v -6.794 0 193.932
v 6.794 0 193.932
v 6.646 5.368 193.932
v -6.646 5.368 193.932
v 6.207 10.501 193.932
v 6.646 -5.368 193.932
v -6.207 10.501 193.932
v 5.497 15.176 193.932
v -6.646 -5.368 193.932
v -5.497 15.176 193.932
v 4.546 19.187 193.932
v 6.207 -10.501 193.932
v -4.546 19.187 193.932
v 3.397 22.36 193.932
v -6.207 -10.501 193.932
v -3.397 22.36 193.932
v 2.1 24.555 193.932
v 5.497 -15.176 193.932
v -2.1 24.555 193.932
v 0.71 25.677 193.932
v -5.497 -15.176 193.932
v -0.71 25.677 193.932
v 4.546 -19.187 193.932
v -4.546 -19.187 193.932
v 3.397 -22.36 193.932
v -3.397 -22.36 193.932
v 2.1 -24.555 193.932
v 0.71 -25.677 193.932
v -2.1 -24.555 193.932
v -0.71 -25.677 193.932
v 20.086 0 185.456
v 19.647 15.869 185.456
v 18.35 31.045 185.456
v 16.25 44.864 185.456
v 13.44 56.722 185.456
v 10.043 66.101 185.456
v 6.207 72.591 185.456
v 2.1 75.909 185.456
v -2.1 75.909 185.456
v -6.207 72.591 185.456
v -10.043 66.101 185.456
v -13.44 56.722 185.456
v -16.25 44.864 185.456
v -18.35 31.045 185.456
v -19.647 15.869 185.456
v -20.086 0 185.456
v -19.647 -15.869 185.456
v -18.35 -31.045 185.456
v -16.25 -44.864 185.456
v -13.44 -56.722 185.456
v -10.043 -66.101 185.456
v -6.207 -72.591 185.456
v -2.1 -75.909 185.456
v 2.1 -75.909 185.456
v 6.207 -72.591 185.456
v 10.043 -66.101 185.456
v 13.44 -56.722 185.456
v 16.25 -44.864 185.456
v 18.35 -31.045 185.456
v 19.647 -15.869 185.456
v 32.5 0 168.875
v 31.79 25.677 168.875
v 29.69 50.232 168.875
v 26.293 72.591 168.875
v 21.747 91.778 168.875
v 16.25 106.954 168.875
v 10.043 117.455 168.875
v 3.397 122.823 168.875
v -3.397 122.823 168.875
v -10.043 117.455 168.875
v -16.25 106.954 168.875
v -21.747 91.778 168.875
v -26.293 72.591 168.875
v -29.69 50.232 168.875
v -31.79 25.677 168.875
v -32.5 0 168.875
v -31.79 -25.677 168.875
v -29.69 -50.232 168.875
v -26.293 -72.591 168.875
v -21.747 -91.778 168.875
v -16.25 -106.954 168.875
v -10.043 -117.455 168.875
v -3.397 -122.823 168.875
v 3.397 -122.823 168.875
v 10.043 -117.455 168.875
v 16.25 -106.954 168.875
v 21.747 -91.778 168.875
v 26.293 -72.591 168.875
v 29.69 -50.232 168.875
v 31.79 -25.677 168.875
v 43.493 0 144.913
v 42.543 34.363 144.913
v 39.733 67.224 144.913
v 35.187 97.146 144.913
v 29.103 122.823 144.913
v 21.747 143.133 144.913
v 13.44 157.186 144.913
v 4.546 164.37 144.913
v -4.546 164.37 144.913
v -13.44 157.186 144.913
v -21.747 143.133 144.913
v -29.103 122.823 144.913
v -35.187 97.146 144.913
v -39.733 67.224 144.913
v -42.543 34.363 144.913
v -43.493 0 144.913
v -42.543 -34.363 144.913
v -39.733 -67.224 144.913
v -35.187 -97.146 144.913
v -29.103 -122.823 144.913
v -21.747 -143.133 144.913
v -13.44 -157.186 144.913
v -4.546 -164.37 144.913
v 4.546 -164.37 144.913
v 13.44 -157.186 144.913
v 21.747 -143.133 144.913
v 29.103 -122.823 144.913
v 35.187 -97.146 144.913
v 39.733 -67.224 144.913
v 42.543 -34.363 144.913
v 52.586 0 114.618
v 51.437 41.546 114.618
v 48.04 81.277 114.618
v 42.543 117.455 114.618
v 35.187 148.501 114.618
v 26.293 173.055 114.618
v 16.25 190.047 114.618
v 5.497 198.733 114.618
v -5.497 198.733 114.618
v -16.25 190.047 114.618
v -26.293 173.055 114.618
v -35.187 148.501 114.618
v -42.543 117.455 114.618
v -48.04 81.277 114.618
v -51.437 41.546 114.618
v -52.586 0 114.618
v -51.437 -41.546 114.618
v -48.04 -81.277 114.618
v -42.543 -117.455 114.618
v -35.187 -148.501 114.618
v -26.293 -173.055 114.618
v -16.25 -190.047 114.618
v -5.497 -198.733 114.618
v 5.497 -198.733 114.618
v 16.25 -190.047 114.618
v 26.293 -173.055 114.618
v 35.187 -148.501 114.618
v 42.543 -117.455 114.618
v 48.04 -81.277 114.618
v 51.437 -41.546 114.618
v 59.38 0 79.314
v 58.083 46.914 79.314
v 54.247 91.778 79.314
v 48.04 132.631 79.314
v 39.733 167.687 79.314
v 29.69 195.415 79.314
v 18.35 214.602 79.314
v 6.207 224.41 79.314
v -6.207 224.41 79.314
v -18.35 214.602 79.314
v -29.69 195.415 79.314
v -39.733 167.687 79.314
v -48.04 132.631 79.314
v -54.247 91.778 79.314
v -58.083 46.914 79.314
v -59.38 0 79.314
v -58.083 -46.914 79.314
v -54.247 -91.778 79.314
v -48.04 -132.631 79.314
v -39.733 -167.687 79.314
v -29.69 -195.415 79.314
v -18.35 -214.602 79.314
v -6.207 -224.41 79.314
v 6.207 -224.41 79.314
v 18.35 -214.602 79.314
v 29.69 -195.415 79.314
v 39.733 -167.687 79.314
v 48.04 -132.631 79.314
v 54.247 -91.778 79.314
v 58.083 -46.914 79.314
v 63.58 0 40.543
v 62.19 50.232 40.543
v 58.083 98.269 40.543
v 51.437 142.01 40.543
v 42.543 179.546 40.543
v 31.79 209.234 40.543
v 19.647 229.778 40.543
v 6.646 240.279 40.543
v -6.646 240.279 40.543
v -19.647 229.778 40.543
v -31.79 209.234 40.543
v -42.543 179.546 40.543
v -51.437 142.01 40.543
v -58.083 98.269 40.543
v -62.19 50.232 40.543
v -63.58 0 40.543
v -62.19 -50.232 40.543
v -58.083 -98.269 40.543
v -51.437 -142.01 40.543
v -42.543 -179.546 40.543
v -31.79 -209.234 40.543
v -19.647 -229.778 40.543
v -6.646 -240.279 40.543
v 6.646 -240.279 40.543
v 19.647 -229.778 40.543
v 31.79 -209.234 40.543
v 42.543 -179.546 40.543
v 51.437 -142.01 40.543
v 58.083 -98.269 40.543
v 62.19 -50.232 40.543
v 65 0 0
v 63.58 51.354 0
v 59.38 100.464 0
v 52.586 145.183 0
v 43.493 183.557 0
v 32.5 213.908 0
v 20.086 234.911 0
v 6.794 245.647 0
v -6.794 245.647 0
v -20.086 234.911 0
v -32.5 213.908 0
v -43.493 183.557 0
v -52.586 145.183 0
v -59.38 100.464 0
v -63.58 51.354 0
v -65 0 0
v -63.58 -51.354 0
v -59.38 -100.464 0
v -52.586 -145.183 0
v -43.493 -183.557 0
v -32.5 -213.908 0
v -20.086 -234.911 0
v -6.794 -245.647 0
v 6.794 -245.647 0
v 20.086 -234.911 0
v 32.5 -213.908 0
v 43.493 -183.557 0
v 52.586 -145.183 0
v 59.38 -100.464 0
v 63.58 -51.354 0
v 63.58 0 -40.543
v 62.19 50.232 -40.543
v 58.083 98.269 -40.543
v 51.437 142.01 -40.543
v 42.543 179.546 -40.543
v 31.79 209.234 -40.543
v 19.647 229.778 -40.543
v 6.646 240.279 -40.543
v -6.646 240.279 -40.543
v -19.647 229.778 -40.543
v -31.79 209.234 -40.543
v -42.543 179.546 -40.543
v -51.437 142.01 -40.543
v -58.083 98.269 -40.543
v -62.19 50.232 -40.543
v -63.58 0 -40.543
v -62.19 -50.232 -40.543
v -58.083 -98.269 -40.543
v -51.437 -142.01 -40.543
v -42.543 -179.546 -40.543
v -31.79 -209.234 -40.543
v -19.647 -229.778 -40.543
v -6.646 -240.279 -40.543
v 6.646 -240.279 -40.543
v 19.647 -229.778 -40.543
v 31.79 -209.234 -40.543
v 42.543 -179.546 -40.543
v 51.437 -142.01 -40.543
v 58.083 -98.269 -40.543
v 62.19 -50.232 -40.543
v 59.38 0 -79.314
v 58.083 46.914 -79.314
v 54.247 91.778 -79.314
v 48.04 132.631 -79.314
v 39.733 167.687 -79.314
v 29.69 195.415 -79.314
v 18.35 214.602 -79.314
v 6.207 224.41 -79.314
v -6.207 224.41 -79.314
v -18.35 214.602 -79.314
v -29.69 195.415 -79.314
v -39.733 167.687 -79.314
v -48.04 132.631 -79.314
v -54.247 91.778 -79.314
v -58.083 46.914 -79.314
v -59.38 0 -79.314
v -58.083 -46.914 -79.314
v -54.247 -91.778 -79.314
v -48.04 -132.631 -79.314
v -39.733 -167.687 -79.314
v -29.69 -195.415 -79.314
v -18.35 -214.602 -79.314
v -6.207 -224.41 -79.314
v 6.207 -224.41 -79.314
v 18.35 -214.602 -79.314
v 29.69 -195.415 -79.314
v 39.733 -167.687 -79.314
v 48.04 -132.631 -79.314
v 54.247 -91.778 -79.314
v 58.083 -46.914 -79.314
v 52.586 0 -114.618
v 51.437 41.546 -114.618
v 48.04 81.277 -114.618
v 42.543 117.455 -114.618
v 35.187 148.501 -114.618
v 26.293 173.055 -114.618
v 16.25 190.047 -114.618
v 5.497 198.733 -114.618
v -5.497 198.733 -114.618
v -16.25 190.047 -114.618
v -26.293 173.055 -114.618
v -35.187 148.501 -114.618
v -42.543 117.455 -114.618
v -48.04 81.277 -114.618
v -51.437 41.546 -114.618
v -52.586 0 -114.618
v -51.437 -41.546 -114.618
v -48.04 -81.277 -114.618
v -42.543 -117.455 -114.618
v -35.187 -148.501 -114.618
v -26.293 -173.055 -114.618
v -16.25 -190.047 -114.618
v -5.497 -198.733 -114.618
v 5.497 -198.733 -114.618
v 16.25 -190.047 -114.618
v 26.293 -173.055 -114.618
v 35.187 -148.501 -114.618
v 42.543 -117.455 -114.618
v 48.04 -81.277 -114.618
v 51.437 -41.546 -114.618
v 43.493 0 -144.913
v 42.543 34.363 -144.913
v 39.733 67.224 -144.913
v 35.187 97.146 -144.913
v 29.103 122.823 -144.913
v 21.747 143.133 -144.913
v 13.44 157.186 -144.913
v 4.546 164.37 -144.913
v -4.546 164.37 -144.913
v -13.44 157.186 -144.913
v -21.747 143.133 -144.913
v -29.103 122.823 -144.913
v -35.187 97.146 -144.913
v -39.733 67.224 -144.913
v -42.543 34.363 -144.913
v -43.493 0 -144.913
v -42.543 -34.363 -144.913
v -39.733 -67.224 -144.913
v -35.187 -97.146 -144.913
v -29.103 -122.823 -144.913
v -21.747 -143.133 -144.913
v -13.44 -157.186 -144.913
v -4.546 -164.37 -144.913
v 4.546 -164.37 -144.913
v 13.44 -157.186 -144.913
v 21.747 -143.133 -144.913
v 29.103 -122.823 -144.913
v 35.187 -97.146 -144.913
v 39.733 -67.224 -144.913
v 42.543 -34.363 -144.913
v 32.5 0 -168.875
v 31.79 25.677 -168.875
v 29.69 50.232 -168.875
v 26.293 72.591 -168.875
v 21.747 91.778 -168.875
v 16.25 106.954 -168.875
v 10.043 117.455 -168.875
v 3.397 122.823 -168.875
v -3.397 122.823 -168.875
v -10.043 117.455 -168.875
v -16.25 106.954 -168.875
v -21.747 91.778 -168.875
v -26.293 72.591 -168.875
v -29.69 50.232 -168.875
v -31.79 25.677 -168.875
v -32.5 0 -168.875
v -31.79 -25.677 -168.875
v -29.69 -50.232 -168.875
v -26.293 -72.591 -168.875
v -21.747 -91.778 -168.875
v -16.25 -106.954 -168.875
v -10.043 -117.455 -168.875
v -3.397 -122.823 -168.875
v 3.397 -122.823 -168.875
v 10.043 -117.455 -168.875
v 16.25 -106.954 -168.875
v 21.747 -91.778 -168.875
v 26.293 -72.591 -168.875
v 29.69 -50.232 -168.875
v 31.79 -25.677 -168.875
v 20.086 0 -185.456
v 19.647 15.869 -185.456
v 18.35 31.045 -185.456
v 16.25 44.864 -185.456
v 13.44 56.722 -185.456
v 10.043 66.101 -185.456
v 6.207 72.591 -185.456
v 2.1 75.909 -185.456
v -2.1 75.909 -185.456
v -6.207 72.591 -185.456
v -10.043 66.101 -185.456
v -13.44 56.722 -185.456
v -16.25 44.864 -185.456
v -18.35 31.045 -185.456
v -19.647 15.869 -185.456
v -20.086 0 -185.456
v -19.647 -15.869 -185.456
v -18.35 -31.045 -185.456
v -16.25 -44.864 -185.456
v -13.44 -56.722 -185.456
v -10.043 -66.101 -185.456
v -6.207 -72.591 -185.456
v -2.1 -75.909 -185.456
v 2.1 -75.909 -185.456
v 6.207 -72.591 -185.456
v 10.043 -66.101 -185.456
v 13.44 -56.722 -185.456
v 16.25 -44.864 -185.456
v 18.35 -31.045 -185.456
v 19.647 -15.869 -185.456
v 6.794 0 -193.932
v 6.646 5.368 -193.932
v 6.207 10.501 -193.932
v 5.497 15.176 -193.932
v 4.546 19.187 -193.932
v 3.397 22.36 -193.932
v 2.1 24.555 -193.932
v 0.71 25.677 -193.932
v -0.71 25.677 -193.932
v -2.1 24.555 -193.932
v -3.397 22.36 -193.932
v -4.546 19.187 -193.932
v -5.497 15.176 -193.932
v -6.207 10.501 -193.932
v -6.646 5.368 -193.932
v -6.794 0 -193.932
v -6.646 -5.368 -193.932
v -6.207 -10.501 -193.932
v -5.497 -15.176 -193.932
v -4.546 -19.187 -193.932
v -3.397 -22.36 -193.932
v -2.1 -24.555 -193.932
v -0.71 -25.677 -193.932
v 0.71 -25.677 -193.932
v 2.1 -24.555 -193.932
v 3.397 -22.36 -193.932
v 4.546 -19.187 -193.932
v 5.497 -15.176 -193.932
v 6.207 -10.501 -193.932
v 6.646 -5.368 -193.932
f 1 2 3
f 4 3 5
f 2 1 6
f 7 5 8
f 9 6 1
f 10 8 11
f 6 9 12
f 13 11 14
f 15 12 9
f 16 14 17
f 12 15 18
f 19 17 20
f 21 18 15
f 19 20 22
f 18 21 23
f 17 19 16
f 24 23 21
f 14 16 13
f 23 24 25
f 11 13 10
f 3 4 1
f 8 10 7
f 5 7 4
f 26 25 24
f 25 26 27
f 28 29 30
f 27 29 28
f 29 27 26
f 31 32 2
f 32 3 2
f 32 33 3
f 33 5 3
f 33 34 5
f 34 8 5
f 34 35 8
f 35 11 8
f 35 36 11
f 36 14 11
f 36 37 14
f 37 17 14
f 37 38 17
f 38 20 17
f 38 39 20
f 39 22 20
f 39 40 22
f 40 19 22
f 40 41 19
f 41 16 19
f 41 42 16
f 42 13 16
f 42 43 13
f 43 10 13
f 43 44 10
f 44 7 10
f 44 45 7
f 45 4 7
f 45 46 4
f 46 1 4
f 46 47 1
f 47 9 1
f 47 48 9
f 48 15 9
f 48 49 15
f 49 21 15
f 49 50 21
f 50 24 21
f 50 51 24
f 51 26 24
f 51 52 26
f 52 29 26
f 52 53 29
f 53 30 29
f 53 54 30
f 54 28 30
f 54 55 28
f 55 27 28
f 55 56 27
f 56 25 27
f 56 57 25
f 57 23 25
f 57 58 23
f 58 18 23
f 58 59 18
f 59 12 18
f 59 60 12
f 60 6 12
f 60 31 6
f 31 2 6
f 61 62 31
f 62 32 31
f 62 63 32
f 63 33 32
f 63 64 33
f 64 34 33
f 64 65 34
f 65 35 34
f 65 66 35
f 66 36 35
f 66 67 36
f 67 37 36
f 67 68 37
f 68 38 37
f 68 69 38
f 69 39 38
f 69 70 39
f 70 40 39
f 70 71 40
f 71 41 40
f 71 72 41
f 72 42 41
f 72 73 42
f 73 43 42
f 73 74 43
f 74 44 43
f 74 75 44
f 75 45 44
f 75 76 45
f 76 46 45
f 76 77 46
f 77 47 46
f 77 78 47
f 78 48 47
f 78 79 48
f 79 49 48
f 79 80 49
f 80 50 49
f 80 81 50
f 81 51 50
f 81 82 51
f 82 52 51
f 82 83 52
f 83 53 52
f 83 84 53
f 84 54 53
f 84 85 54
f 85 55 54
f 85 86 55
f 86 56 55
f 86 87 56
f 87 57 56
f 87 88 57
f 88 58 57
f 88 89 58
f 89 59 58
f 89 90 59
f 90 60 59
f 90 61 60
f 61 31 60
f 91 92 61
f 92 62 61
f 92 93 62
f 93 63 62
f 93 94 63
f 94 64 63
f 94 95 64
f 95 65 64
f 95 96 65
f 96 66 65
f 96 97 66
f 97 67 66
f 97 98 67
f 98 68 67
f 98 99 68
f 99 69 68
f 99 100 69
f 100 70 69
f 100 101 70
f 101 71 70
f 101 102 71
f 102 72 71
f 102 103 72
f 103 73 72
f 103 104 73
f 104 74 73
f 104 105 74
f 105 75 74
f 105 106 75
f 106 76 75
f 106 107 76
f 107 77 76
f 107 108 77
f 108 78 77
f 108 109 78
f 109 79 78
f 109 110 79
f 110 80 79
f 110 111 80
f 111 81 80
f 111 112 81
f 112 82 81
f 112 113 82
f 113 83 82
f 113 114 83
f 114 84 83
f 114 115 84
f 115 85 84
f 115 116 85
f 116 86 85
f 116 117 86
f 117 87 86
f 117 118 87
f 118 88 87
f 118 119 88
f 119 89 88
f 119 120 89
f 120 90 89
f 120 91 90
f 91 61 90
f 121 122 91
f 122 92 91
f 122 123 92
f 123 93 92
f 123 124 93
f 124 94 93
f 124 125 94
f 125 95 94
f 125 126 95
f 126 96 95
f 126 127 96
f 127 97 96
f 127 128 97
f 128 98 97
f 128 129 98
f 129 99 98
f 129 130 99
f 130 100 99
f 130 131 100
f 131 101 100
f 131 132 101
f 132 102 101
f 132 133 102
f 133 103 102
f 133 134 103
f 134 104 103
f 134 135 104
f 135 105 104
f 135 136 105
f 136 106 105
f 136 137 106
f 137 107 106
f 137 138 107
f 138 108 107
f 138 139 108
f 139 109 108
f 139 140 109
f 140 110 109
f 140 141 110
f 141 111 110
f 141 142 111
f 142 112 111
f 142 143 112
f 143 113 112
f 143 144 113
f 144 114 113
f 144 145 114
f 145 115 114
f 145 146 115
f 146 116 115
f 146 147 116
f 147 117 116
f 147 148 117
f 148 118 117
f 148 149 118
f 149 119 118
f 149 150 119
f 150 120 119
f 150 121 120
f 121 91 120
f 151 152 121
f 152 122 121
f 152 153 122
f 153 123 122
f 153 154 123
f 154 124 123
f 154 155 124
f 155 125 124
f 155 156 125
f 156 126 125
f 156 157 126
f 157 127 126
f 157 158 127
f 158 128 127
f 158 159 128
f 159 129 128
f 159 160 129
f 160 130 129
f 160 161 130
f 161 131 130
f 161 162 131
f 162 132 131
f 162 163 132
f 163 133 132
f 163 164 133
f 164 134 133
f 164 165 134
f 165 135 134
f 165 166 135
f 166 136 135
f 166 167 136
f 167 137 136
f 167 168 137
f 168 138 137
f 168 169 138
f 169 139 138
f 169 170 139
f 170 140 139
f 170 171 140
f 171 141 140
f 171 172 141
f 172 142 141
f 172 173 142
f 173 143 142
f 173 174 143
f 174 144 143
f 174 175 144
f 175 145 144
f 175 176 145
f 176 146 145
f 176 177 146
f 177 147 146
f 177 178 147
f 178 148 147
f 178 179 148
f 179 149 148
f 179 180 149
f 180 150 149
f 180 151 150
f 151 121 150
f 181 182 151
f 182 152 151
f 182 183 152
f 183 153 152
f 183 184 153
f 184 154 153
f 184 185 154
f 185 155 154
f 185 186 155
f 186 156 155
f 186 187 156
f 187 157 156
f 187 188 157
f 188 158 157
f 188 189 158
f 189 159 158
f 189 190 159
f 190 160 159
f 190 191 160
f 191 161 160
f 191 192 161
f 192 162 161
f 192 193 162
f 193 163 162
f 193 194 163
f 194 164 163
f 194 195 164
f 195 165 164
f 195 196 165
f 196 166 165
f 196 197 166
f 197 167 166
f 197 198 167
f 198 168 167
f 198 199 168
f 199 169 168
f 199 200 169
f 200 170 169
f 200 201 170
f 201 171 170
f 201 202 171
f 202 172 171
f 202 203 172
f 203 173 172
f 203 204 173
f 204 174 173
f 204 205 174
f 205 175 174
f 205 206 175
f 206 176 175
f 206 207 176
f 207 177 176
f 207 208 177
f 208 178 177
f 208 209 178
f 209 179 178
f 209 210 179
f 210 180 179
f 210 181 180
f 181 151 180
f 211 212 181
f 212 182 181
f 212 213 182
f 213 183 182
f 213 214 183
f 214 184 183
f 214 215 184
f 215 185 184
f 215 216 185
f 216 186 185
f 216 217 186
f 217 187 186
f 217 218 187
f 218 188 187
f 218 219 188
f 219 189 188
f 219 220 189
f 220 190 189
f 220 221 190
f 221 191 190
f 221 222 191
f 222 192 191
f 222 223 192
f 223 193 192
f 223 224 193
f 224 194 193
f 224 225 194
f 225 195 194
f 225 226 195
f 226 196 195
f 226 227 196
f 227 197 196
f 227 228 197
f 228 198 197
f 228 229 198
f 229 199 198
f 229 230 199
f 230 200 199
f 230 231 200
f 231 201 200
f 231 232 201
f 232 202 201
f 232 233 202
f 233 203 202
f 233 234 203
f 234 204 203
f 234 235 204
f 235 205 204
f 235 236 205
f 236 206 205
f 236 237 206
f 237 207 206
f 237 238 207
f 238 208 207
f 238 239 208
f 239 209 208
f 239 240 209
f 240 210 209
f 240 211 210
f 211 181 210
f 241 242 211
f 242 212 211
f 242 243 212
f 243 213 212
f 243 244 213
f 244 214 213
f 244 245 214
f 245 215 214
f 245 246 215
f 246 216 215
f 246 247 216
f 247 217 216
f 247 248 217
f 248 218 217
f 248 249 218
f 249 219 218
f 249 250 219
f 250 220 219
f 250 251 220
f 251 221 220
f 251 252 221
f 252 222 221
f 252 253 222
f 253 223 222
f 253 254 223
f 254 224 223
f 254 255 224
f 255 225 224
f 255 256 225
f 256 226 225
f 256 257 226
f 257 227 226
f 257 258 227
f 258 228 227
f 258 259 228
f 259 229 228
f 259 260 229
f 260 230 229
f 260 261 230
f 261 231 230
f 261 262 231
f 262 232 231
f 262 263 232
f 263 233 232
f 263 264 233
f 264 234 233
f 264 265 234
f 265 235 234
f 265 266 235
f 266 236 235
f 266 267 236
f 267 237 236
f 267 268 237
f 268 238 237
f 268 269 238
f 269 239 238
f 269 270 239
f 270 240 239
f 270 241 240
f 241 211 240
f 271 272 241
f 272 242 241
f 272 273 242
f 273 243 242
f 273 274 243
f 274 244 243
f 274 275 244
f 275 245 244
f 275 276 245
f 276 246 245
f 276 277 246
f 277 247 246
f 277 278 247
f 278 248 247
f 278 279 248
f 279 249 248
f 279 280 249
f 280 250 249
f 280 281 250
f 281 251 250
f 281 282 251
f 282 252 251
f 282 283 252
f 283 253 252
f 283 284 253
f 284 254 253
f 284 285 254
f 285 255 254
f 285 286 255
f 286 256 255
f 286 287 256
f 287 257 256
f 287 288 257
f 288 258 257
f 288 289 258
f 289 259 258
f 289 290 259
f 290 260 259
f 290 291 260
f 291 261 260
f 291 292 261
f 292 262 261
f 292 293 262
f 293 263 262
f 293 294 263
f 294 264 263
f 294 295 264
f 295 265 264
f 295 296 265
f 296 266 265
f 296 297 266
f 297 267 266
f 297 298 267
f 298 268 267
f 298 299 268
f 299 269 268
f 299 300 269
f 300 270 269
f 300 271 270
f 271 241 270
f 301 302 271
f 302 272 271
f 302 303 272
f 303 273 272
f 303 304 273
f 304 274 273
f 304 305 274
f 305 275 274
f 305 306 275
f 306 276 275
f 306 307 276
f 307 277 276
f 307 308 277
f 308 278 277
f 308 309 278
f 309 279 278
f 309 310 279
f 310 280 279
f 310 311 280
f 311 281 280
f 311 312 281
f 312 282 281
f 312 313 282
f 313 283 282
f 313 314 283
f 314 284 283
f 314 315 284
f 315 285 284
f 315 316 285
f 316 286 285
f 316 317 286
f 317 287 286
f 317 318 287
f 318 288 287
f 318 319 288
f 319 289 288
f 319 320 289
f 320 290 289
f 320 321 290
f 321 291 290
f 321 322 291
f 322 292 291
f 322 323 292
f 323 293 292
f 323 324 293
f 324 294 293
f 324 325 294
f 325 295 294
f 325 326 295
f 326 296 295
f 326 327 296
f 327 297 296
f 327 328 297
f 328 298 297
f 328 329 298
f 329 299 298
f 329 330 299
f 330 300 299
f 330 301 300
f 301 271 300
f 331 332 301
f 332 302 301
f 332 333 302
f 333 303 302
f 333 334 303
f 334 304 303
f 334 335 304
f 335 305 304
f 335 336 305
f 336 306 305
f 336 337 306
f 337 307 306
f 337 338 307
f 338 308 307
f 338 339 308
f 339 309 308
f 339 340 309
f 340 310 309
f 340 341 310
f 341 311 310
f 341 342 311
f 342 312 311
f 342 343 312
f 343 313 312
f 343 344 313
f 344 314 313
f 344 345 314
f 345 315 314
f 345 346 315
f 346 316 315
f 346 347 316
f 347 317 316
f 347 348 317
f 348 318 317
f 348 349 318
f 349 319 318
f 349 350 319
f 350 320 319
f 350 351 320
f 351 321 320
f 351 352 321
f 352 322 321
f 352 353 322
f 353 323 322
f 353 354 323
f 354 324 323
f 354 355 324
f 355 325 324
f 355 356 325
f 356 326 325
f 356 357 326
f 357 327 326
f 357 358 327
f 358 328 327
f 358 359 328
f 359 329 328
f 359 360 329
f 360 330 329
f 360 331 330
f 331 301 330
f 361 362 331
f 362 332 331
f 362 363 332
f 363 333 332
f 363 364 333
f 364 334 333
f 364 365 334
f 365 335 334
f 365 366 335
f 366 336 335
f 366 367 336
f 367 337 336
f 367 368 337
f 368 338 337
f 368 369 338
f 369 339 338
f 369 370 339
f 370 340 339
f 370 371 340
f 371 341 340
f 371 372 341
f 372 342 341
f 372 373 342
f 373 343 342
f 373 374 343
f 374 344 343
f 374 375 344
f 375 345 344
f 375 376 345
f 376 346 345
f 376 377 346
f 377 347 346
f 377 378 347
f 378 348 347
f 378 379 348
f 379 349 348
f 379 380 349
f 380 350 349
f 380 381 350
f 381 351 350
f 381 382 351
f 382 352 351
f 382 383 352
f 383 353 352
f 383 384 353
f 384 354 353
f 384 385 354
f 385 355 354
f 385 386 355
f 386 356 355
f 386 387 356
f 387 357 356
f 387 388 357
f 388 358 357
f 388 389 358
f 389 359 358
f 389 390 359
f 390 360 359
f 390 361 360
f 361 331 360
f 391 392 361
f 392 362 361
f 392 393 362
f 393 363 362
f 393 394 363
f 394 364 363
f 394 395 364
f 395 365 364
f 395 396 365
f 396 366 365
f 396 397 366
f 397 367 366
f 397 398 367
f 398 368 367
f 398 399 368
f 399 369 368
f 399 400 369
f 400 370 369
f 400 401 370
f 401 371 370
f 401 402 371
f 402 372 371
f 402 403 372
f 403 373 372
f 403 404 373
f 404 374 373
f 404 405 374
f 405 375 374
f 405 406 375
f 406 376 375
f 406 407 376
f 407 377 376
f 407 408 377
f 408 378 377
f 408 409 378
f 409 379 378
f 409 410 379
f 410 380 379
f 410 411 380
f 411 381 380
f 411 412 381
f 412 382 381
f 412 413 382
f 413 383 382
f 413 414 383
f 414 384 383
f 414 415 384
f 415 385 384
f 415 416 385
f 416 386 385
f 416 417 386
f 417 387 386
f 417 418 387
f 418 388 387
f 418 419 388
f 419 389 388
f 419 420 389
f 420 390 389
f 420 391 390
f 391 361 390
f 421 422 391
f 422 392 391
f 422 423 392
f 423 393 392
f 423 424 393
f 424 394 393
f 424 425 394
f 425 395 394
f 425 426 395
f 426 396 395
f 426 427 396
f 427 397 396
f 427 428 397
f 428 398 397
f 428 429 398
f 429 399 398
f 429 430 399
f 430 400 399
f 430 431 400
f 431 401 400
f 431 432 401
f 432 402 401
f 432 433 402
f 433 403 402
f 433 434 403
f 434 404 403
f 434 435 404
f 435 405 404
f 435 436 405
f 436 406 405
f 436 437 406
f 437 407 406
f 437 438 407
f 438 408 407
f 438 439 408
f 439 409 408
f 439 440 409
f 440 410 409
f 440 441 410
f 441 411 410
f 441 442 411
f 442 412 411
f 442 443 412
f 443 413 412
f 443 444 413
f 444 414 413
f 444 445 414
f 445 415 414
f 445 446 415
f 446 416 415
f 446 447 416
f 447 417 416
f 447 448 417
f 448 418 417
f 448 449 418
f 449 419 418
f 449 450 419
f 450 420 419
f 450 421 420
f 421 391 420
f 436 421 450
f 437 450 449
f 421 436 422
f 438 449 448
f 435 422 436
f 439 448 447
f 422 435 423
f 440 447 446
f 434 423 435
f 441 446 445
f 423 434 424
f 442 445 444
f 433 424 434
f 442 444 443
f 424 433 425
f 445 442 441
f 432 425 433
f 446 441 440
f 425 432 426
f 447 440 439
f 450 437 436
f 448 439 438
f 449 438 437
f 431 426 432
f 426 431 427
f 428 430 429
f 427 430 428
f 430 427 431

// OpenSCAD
// Generated by SolidPython 1.0.1 on 2020-07-29 00:46:47


scale(v = [5, 19, 15]) {
	sphere(r = 13);
}
/***********************************************
*********      SolidPython code:      **********
************************************************
 
# import packages: SolidPython
from solid import *
from solid.utils import *
from itertools import chain, combinations, permutations


class Resize:

    def __init__(self, scad_file):
        self.scad_file = scad_file
        #self.scad_file = import_scad(scad_file)
        # cone/cylinder param:
        self.r1 = 0
        self.r2 = 0
        self.h = 0
        # rectangular prism param:
        self.w = 0
        self.l = 0
        # ellipse param:
        self.r = 0

    # import OpenScad code (file name corresponds to shape)


    # classify shape + parameters
    def assign(self, param1, param2, param3):
        if self.scad_file == 'cone.scad':
            self.r1 = param1
            self.r2 = param2
            self.h = param3
        elif self.scad_file == 'cylinder.scad':
            self.r1 = param1
            self.r2 = param2
            self.h = param3
        elif self.scad_file == 'rectangularPrism.scad':
            self.h = param1
            self.l = param2
            self.w = param3
        else:
            self.r = param1
            self.h = param2

    # resize parameters
    def iterate(self):
        x = range(3, 20, 2)
        i = 1
        if self.scad_file == 'cone.scad':
            tempList = list(permutations(x, 2))
            for temp in tempList:
                param1 = temp[0]
                param2 = temp[1]
                filepath = 'produced_scad_files/' + 'cone' + str(param1) + '_' + str(param2) + '_' + '.scad'
                scad_render_to_file(cylinder(h=param1, r1=param2, r2=0), filepath)

        elif self.scad_file == 'cylinder.scad':
            tempList = list(permutations(x, 3))
            for temp in tempList:
                param1 = temp[0]
                param2 = temp[1]
                filepath = 'produced_scad_files/' + 'cylinder' + str(param1) + '_' + str(param2) + '_' + '.scad'
                scad_render_to_file(cylinder(h=param1, r1=param2, r2=param2), filepath)

        elif self.scad_file == 'rectangularPrism.scad':
            tempList = list(permutations(x, 3))
            for temp in tempList:
                param1 = temp[0]
                param2 = temp[1]
                param3 = temp[2]
                filepath = 'produced_scad_files/' + 'rectangularPrism' + str(param1) + '_' + str(param2) + '_' + str(
                    param3) + '.scad'
                scad_render_to_file(cube(size=(param1, param2, param3)), filepath)

        elif self.scad_file == 'ellipse.scad':
            tempList = list(permutations(x, 4))
            for temp in tempList:
                param1 = temp[0]
                param2 = temp[1]
                param3 = temp[2]
                param4 = temp[3]
                filepath = 'produced_scad_files/' + 'ellipse' + str(param1) + '_' + str(param2) + '_' + str(param3) + '_' + str(param4) + '.scad'
                scad_render_to_file(scale([param1, param2, param3])(sphere(r=param4)), filepath)

    def render_to_scadfile(self):
        scad_render_to_file(scad, 'example.scad') 
 
************************************************/
